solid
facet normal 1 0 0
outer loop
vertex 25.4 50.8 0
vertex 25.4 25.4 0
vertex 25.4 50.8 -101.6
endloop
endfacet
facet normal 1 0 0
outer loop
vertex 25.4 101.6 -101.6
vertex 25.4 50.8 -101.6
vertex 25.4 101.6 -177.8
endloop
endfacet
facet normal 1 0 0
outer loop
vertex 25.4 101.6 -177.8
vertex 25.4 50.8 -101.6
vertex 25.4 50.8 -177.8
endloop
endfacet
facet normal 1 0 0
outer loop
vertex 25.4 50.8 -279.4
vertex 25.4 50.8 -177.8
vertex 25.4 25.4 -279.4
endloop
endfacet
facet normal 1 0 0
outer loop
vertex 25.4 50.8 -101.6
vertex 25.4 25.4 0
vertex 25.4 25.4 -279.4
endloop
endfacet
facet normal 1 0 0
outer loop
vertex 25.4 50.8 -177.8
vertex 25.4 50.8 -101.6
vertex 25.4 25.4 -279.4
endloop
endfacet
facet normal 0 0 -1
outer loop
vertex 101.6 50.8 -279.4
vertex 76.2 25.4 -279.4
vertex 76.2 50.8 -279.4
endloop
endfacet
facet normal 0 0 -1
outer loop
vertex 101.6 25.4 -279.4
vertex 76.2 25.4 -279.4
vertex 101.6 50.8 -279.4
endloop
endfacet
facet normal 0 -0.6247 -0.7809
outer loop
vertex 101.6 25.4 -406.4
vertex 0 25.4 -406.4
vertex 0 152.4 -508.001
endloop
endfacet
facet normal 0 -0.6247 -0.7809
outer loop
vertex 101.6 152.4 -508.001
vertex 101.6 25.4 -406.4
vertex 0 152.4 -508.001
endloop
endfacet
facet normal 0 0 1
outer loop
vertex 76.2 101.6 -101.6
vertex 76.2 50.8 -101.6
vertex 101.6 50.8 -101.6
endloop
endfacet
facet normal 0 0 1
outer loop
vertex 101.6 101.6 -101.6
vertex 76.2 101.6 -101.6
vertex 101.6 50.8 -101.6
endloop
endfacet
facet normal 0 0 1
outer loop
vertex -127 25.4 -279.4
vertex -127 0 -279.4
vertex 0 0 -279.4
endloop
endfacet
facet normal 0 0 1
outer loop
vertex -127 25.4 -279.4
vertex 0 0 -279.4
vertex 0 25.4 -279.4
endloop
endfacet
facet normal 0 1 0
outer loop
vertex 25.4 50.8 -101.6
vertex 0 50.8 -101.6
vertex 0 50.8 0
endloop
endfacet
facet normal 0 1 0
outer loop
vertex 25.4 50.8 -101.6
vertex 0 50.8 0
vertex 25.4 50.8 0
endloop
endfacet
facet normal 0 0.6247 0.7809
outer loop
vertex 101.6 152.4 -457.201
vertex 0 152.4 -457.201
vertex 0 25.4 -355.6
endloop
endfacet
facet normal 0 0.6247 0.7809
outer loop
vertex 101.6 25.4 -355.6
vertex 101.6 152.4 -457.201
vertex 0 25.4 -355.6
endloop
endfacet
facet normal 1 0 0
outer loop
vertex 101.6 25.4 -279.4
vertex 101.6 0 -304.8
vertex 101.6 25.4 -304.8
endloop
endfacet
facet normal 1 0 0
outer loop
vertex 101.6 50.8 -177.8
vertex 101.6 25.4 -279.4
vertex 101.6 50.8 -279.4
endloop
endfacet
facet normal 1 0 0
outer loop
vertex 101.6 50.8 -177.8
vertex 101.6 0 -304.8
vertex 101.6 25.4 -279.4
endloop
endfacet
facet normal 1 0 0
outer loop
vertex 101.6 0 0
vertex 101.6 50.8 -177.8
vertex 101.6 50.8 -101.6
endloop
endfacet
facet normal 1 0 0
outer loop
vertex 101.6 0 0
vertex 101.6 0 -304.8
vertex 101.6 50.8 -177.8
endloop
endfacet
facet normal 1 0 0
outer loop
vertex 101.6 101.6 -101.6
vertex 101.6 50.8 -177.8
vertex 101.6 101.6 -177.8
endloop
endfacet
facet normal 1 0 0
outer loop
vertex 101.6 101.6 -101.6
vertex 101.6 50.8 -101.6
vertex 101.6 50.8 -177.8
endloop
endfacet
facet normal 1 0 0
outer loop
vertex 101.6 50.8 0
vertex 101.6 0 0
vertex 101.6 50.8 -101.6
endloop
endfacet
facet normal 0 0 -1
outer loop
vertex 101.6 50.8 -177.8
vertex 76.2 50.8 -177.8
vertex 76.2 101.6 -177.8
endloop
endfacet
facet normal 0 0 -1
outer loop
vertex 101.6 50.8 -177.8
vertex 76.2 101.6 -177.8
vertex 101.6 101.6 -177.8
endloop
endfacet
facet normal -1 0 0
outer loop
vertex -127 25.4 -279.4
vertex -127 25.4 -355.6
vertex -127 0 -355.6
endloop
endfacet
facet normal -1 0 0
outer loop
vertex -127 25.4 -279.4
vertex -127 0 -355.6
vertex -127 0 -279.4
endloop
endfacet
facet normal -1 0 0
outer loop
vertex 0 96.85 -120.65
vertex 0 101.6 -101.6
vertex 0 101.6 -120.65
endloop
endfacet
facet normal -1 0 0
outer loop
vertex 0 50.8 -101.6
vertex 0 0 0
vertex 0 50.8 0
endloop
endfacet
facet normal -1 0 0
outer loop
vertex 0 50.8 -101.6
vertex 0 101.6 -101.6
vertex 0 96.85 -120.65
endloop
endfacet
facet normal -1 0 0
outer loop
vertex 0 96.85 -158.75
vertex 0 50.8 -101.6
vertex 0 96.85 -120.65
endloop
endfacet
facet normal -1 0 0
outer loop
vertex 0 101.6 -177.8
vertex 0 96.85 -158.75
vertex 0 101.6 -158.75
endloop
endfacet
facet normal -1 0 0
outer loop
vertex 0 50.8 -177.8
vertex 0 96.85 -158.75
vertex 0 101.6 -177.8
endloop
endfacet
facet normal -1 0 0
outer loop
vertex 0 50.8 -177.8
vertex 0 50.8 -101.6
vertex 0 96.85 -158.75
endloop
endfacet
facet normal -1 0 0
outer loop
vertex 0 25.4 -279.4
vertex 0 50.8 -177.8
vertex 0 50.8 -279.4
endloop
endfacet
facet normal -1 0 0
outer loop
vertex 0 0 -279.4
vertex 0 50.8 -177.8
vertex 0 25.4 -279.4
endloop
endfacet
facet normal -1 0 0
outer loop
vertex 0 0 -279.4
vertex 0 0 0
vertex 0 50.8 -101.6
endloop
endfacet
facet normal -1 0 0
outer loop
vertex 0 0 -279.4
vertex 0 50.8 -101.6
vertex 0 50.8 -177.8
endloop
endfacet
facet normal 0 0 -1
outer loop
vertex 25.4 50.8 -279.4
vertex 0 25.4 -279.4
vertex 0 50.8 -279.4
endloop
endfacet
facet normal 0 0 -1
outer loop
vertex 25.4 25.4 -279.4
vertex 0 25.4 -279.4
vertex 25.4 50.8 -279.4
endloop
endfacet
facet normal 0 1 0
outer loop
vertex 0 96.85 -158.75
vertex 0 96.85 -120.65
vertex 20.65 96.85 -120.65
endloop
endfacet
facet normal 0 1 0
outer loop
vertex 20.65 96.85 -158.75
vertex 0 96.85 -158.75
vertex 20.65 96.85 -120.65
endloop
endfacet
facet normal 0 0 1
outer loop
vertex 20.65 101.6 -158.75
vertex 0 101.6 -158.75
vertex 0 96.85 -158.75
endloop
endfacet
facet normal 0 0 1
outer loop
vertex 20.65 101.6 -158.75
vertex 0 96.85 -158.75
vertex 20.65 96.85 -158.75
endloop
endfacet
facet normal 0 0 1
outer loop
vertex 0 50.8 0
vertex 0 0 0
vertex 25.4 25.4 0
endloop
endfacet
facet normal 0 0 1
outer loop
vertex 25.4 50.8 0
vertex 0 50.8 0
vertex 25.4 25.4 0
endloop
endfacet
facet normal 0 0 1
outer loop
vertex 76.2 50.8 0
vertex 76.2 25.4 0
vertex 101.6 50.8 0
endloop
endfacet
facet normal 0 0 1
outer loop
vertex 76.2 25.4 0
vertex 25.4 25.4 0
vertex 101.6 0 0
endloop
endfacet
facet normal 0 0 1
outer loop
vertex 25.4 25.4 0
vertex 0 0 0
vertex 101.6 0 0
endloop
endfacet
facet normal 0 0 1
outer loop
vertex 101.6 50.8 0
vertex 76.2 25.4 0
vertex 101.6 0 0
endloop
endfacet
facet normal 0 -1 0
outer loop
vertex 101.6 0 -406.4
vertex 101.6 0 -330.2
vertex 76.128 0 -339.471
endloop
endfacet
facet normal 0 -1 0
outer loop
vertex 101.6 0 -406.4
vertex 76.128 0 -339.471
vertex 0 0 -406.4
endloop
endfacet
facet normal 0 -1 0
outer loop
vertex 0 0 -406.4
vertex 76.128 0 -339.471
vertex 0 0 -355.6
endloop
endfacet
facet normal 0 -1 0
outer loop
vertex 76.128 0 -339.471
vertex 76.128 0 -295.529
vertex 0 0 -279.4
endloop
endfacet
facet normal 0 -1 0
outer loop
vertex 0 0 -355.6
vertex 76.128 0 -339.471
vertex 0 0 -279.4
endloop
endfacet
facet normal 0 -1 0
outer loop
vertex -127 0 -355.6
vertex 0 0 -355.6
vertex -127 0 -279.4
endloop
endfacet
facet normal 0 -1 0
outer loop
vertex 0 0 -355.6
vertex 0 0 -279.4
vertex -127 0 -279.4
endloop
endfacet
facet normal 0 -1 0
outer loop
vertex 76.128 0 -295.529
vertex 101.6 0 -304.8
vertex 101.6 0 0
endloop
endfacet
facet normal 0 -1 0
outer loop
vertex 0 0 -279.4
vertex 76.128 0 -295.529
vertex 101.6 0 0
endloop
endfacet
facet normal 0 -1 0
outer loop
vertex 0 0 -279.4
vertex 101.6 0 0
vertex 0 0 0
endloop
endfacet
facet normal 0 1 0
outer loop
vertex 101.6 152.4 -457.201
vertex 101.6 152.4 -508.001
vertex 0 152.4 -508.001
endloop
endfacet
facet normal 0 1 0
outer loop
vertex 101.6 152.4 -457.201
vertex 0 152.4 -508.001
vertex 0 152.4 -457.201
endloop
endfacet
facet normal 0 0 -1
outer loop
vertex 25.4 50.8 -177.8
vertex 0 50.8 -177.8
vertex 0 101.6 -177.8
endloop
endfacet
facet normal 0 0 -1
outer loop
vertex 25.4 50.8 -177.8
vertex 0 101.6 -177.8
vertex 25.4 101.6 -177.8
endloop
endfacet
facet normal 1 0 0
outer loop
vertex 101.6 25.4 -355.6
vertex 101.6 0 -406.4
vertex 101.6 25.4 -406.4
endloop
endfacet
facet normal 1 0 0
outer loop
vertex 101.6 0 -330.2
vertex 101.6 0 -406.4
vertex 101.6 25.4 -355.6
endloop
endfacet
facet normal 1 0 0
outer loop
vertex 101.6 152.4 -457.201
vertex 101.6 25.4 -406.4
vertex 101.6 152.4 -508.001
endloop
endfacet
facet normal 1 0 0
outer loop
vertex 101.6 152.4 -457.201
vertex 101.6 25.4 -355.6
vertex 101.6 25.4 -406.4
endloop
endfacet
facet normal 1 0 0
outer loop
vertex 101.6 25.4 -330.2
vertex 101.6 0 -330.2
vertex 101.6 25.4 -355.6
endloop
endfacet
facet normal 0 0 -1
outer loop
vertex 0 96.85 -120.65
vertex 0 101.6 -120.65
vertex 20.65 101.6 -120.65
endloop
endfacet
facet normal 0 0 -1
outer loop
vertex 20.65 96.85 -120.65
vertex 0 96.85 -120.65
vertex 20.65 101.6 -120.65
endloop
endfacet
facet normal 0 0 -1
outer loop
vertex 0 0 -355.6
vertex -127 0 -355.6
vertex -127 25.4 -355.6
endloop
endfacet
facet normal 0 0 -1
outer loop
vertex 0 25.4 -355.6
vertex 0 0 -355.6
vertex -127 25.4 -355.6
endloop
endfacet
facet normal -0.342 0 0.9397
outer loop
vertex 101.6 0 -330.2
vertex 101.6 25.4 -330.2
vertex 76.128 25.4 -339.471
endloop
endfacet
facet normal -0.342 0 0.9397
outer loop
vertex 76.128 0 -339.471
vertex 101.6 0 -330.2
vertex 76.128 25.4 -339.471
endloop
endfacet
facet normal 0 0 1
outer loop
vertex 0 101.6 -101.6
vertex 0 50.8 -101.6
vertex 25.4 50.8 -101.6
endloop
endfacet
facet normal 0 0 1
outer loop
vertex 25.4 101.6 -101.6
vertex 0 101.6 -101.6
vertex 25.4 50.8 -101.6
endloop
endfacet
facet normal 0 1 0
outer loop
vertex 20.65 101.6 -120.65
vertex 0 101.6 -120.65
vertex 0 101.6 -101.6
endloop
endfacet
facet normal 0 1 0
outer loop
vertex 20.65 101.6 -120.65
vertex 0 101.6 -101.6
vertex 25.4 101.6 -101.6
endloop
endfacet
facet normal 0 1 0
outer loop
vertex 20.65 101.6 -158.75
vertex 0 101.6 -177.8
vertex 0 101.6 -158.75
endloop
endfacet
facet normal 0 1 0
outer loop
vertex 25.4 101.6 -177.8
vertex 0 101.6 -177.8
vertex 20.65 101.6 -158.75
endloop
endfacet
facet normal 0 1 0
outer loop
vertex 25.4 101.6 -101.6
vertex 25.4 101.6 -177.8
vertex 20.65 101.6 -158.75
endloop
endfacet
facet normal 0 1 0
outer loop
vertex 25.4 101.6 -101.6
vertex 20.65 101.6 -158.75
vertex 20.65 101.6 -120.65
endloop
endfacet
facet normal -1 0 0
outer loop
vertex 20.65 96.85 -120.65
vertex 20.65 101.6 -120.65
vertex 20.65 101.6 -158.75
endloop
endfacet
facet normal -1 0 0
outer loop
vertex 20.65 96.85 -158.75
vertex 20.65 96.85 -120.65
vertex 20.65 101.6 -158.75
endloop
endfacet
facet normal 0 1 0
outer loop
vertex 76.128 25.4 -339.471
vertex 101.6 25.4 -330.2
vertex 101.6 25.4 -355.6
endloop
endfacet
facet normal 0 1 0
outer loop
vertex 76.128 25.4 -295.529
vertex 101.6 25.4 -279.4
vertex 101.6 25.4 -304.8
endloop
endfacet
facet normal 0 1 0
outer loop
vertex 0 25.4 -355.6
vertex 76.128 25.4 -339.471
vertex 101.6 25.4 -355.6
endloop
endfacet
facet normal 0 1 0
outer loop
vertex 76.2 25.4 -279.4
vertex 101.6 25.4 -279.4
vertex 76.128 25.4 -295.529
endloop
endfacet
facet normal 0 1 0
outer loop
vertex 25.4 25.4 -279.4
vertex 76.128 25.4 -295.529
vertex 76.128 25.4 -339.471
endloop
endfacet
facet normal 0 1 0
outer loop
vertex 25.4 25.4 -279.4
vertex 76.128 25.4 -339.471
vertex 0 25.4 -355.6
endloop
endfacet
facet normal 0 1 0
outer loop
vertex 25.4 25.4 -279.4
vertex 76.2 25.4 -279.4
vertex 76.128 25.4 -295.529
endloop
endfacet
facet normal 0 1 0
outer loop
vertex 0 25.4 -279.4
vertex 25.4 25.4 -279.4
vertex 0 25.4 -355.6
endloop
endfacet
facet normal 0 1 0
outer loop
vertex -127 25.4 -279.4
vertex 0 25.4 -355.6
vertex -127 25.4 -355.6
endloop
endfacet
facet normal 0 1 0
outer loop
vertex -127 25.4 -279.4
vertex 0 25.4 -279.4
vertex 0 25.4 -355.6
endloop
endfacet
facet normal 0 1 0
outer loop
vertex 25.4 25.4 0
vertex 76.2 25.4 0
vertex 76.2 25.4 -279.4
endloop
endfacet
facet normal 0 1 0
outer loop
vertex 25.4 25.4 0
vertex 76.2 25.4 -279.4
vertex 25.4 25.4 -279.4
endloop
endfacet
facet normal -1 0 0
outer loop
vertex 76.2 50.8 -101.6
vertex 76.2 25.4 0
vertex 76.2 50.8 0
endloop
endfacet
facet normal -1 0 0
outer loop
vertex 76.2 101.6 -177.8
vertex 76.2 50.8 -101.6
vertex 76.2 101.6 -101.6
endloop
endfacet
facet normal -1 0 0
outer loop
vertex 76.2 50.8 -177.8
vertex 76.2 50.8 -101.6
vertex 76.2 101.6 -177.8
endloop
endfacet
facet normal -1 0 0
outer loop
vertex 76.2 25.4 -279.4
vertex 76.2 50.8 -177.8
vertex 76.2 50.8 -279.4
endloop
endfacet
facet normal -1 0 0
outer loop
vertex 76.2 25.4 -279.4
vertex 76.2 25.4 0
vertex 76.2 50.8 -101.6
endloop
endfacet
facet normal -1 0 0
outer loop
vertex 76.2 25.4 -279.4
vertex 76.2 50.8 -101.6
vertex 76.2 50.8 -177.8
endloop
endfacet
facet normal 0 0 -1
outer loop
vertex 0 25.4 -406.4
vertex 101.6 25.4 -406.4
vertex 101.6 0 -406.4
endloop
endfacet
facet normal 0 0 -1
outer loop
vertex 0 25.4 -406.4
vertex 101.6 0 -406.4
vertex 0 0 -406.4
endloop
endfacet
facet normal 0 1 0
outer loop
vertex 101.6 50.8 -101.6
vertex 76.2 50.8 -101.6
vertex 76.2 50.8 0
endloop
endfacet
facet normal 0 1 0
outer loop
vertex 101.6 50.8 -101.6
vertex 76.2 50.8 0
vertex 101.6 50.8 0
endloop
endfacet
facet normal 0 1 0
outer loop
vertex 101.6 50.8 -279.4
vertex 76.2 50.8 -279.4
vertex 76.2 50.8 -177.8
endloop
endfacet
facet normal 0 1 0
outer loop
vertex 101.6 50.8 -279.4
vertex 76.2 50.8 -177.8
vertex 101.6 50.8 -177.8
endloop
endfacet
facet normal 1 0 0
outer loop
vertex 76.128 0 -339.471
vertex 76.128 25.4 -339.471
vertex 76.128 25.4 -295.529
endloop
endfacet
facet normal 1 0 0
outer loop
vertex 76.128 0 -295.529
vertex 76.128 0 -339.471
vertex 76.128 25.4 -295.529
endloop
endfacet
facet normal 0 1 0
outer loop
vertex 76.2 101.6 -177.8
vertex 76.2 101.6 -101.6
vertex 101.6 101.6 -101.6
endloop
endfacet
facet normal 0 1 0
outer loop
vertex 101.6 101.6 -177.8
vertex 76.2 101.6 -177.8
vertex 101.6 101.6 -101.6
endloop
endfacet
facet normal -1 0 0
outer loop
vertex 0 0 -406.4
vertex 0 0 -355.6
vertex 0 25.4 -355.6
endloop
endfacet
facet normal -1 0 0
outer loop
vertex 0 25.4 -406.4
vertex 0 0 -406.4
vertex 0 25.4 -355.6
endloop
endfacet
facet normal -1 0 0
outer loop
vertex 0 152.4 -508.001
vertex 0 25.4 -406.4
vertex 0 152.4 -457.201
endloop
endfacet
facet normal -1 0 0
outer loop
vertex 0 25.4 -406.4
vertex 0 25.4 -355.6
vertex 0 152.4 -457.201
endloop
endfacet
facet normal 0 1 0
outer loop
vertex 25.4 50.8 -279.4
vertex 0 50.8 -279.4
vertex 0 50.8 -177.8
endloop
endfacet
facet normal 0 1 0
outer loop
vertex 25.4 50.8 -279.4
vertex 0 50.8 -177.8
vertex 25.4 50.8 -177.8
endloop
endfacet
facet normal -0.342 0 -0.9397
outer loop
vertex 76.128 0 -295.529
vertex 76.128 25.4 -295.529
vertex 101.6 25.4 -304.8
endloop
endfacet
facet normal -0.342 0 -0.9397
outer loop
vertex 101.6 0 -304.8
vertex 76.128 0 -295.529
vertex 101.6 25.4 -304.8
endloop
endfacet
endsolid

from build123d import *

# Parameters (mm, degrees)
SKETCH1_W           = 101.6
SKETCH1_H           = 355.6
BOSS_EXTRUDE1_DEPTH = 25.4
SKETCH2_W           = 76.2
SKETCH2_H           = 25.4
BOSS_EXTRUDE2_DEPTH = 127
SKETCH3_W           = 25.4
SKETCH3_H           = 279.4
BOSS_EXTRUDE3_DEPTH = 25.4
SKETCH5_W           = 25.4
SKETCH5_H           = 279.4
BOSS_EXTRUDE4_DEPTH = 25.4
SKETCH6_W           = 25.4
SKETCH6_H           = 76.2
BOSS_EXTRUDE5_DEPTH = 50.8
SKETCH8_W           = 25.4
SKETCH8_H           = 76.2
BOSS_EXTRUDE6_DEPTH = 50.8
SKETCH9_W           = 101.6
SKETCH9_H           = 25.4
BOSS_EXTRUDE7_DEPTH = 50.8
LOFT1_DEPTH         = 101.6
CUT_EXTRUDE2_DEPTH  = 539.816024431
SKETCH18_W          = 20.6502
SKETCH18_H          = 38.1
CUT_EXTRUDE3_DEPTH  = 4.7498


# Read off the part's stored shape, not the designer's step: Loft1
with BuildPart() as part:
    # Sketch1 → Boss-Extrude1 (new body)
    with BuildSketch(Plane(origin=(0, 0, 0), x_dir=(1, 0, 0), z_dir=(0, 1, 0))):
        with Locations((50.8, 177.8)):
            Rectangle(SKETCH1_W, SKETCH1_H)
    extrude(amount=BOSS_EXTRUDE1_DEPTH)

    # Sketch2 → Boss-Extrude2 (add)
    with BuildSketch(Plane.ZY):
        with Locations((-317.5, 12.7)):
            Rectangle(SKETCH2_W, SKETCH2_H)
    extrude(amount=BOSS_EXTRUDE2_DEPTH)

    # Sketch3 → Boss-Extrude3 (add)
    with BuildSketch(Plane(origin=(0, 25.4, 0), x_dir=(1, 0, 0), z_dir=(0, 1, 0))):
        with Locations((12.7, 139.7)):
            Rectangle(SKETCH3_W, SKETCH3_H)
    extrude(amount=BOSS_EXTRUDE3_DEPTH)

    # Sketch5 → Boss-Extrude4 (add)
    with BuildSketch(Plane(origin=(0, 25.4, 0), x_dir=(1, 0, 0), z_dir=(0, 1, 0))):
        with Locations((88.9, 139.7)):
            Rectangle(SKETCH5_W, SKETCH5_H)
    extrude(amount=BOSS_EXTRUDE4_DEPTH)

    # Sketch6 → Boss-Extrude5 (add)
    with BuildSketch(Plane(origin=(0, 50.8, 0), x_dir=(1, 0, 0), z_dir=(0, 1, 0))):
        with Locations((12.7, 139.7)):
            Rectangle(SKETCH6_W, SKETCH6_H)
    extrude(amount=BOSS_EXTRUDE5_DEPTH)

    # Sketch8 → Boss-Extrude6 (add)
    with BuildSketch(Plane(origin=(0, 50.8, 0), x_dir=(1, 0, 0), z_dir=(0, 1, 0))):
        with Locations((88.9, 139.7)):
            Rectangle(SKETCH8_W, SKETCH8_H)
    extrude(amount=BOSS_EXTRUDE6_DEPTH)

    # Sketch9 → Boss-Extrude7 (add)
    with BuildSketch(Plane(origin=(0, 0, -355.6), x_dir=(-1, 0, 0), z_dir=(0, 0, -1))):
        with Locations((-50.8, 12.7)):
            Rectangle(SKETCH9_W, SKETCH9_H)
    extrude(amount=BOSS_EXTRUDE7_DEPTH)

    # Loft1 outline → Loft1 (add)
    with BuildSketch(Plane.YZ):
        Polygon((25.4, -406.4), (152.4, -508.000697031), (152.4, -457.200697031), (25.4, -355.6), align=None)
    extrude(amount=LOFT1_DEPTH)

    # Sketch17 → Cut-Extrude2 (cut, through all)
    with BuildSketch(Plane(origin=(0, 25.4, 0), x_dir=(1, 0, 0), z_dir=(0, 1, 0))):
        Polygon((101.6, 304.8), (101.6, 330.2), (76.128136844, 339.471), (76.128136844, 295.529), align=None)
    extrude(amount=-CUT_EXTRUDE2_DEPTH, mode=Mode.SUBTRACT)

    # Sketch18 → Cut-Extrude3 (cut)
    with BuildSketch(Plane(origin=(0, 101.6, 0), x_dir=(1, 0, 0), z_dir=(0, 1, 0))):
        with Locations((10.3251, 139.7)):
            Rectangle(SKETCH18_W, SKETCH18_H)
    extrude(amount=-CUT_EXTRUDE3_DEPTH, mode=Mode.SUBTRACT)


solid = part.part
